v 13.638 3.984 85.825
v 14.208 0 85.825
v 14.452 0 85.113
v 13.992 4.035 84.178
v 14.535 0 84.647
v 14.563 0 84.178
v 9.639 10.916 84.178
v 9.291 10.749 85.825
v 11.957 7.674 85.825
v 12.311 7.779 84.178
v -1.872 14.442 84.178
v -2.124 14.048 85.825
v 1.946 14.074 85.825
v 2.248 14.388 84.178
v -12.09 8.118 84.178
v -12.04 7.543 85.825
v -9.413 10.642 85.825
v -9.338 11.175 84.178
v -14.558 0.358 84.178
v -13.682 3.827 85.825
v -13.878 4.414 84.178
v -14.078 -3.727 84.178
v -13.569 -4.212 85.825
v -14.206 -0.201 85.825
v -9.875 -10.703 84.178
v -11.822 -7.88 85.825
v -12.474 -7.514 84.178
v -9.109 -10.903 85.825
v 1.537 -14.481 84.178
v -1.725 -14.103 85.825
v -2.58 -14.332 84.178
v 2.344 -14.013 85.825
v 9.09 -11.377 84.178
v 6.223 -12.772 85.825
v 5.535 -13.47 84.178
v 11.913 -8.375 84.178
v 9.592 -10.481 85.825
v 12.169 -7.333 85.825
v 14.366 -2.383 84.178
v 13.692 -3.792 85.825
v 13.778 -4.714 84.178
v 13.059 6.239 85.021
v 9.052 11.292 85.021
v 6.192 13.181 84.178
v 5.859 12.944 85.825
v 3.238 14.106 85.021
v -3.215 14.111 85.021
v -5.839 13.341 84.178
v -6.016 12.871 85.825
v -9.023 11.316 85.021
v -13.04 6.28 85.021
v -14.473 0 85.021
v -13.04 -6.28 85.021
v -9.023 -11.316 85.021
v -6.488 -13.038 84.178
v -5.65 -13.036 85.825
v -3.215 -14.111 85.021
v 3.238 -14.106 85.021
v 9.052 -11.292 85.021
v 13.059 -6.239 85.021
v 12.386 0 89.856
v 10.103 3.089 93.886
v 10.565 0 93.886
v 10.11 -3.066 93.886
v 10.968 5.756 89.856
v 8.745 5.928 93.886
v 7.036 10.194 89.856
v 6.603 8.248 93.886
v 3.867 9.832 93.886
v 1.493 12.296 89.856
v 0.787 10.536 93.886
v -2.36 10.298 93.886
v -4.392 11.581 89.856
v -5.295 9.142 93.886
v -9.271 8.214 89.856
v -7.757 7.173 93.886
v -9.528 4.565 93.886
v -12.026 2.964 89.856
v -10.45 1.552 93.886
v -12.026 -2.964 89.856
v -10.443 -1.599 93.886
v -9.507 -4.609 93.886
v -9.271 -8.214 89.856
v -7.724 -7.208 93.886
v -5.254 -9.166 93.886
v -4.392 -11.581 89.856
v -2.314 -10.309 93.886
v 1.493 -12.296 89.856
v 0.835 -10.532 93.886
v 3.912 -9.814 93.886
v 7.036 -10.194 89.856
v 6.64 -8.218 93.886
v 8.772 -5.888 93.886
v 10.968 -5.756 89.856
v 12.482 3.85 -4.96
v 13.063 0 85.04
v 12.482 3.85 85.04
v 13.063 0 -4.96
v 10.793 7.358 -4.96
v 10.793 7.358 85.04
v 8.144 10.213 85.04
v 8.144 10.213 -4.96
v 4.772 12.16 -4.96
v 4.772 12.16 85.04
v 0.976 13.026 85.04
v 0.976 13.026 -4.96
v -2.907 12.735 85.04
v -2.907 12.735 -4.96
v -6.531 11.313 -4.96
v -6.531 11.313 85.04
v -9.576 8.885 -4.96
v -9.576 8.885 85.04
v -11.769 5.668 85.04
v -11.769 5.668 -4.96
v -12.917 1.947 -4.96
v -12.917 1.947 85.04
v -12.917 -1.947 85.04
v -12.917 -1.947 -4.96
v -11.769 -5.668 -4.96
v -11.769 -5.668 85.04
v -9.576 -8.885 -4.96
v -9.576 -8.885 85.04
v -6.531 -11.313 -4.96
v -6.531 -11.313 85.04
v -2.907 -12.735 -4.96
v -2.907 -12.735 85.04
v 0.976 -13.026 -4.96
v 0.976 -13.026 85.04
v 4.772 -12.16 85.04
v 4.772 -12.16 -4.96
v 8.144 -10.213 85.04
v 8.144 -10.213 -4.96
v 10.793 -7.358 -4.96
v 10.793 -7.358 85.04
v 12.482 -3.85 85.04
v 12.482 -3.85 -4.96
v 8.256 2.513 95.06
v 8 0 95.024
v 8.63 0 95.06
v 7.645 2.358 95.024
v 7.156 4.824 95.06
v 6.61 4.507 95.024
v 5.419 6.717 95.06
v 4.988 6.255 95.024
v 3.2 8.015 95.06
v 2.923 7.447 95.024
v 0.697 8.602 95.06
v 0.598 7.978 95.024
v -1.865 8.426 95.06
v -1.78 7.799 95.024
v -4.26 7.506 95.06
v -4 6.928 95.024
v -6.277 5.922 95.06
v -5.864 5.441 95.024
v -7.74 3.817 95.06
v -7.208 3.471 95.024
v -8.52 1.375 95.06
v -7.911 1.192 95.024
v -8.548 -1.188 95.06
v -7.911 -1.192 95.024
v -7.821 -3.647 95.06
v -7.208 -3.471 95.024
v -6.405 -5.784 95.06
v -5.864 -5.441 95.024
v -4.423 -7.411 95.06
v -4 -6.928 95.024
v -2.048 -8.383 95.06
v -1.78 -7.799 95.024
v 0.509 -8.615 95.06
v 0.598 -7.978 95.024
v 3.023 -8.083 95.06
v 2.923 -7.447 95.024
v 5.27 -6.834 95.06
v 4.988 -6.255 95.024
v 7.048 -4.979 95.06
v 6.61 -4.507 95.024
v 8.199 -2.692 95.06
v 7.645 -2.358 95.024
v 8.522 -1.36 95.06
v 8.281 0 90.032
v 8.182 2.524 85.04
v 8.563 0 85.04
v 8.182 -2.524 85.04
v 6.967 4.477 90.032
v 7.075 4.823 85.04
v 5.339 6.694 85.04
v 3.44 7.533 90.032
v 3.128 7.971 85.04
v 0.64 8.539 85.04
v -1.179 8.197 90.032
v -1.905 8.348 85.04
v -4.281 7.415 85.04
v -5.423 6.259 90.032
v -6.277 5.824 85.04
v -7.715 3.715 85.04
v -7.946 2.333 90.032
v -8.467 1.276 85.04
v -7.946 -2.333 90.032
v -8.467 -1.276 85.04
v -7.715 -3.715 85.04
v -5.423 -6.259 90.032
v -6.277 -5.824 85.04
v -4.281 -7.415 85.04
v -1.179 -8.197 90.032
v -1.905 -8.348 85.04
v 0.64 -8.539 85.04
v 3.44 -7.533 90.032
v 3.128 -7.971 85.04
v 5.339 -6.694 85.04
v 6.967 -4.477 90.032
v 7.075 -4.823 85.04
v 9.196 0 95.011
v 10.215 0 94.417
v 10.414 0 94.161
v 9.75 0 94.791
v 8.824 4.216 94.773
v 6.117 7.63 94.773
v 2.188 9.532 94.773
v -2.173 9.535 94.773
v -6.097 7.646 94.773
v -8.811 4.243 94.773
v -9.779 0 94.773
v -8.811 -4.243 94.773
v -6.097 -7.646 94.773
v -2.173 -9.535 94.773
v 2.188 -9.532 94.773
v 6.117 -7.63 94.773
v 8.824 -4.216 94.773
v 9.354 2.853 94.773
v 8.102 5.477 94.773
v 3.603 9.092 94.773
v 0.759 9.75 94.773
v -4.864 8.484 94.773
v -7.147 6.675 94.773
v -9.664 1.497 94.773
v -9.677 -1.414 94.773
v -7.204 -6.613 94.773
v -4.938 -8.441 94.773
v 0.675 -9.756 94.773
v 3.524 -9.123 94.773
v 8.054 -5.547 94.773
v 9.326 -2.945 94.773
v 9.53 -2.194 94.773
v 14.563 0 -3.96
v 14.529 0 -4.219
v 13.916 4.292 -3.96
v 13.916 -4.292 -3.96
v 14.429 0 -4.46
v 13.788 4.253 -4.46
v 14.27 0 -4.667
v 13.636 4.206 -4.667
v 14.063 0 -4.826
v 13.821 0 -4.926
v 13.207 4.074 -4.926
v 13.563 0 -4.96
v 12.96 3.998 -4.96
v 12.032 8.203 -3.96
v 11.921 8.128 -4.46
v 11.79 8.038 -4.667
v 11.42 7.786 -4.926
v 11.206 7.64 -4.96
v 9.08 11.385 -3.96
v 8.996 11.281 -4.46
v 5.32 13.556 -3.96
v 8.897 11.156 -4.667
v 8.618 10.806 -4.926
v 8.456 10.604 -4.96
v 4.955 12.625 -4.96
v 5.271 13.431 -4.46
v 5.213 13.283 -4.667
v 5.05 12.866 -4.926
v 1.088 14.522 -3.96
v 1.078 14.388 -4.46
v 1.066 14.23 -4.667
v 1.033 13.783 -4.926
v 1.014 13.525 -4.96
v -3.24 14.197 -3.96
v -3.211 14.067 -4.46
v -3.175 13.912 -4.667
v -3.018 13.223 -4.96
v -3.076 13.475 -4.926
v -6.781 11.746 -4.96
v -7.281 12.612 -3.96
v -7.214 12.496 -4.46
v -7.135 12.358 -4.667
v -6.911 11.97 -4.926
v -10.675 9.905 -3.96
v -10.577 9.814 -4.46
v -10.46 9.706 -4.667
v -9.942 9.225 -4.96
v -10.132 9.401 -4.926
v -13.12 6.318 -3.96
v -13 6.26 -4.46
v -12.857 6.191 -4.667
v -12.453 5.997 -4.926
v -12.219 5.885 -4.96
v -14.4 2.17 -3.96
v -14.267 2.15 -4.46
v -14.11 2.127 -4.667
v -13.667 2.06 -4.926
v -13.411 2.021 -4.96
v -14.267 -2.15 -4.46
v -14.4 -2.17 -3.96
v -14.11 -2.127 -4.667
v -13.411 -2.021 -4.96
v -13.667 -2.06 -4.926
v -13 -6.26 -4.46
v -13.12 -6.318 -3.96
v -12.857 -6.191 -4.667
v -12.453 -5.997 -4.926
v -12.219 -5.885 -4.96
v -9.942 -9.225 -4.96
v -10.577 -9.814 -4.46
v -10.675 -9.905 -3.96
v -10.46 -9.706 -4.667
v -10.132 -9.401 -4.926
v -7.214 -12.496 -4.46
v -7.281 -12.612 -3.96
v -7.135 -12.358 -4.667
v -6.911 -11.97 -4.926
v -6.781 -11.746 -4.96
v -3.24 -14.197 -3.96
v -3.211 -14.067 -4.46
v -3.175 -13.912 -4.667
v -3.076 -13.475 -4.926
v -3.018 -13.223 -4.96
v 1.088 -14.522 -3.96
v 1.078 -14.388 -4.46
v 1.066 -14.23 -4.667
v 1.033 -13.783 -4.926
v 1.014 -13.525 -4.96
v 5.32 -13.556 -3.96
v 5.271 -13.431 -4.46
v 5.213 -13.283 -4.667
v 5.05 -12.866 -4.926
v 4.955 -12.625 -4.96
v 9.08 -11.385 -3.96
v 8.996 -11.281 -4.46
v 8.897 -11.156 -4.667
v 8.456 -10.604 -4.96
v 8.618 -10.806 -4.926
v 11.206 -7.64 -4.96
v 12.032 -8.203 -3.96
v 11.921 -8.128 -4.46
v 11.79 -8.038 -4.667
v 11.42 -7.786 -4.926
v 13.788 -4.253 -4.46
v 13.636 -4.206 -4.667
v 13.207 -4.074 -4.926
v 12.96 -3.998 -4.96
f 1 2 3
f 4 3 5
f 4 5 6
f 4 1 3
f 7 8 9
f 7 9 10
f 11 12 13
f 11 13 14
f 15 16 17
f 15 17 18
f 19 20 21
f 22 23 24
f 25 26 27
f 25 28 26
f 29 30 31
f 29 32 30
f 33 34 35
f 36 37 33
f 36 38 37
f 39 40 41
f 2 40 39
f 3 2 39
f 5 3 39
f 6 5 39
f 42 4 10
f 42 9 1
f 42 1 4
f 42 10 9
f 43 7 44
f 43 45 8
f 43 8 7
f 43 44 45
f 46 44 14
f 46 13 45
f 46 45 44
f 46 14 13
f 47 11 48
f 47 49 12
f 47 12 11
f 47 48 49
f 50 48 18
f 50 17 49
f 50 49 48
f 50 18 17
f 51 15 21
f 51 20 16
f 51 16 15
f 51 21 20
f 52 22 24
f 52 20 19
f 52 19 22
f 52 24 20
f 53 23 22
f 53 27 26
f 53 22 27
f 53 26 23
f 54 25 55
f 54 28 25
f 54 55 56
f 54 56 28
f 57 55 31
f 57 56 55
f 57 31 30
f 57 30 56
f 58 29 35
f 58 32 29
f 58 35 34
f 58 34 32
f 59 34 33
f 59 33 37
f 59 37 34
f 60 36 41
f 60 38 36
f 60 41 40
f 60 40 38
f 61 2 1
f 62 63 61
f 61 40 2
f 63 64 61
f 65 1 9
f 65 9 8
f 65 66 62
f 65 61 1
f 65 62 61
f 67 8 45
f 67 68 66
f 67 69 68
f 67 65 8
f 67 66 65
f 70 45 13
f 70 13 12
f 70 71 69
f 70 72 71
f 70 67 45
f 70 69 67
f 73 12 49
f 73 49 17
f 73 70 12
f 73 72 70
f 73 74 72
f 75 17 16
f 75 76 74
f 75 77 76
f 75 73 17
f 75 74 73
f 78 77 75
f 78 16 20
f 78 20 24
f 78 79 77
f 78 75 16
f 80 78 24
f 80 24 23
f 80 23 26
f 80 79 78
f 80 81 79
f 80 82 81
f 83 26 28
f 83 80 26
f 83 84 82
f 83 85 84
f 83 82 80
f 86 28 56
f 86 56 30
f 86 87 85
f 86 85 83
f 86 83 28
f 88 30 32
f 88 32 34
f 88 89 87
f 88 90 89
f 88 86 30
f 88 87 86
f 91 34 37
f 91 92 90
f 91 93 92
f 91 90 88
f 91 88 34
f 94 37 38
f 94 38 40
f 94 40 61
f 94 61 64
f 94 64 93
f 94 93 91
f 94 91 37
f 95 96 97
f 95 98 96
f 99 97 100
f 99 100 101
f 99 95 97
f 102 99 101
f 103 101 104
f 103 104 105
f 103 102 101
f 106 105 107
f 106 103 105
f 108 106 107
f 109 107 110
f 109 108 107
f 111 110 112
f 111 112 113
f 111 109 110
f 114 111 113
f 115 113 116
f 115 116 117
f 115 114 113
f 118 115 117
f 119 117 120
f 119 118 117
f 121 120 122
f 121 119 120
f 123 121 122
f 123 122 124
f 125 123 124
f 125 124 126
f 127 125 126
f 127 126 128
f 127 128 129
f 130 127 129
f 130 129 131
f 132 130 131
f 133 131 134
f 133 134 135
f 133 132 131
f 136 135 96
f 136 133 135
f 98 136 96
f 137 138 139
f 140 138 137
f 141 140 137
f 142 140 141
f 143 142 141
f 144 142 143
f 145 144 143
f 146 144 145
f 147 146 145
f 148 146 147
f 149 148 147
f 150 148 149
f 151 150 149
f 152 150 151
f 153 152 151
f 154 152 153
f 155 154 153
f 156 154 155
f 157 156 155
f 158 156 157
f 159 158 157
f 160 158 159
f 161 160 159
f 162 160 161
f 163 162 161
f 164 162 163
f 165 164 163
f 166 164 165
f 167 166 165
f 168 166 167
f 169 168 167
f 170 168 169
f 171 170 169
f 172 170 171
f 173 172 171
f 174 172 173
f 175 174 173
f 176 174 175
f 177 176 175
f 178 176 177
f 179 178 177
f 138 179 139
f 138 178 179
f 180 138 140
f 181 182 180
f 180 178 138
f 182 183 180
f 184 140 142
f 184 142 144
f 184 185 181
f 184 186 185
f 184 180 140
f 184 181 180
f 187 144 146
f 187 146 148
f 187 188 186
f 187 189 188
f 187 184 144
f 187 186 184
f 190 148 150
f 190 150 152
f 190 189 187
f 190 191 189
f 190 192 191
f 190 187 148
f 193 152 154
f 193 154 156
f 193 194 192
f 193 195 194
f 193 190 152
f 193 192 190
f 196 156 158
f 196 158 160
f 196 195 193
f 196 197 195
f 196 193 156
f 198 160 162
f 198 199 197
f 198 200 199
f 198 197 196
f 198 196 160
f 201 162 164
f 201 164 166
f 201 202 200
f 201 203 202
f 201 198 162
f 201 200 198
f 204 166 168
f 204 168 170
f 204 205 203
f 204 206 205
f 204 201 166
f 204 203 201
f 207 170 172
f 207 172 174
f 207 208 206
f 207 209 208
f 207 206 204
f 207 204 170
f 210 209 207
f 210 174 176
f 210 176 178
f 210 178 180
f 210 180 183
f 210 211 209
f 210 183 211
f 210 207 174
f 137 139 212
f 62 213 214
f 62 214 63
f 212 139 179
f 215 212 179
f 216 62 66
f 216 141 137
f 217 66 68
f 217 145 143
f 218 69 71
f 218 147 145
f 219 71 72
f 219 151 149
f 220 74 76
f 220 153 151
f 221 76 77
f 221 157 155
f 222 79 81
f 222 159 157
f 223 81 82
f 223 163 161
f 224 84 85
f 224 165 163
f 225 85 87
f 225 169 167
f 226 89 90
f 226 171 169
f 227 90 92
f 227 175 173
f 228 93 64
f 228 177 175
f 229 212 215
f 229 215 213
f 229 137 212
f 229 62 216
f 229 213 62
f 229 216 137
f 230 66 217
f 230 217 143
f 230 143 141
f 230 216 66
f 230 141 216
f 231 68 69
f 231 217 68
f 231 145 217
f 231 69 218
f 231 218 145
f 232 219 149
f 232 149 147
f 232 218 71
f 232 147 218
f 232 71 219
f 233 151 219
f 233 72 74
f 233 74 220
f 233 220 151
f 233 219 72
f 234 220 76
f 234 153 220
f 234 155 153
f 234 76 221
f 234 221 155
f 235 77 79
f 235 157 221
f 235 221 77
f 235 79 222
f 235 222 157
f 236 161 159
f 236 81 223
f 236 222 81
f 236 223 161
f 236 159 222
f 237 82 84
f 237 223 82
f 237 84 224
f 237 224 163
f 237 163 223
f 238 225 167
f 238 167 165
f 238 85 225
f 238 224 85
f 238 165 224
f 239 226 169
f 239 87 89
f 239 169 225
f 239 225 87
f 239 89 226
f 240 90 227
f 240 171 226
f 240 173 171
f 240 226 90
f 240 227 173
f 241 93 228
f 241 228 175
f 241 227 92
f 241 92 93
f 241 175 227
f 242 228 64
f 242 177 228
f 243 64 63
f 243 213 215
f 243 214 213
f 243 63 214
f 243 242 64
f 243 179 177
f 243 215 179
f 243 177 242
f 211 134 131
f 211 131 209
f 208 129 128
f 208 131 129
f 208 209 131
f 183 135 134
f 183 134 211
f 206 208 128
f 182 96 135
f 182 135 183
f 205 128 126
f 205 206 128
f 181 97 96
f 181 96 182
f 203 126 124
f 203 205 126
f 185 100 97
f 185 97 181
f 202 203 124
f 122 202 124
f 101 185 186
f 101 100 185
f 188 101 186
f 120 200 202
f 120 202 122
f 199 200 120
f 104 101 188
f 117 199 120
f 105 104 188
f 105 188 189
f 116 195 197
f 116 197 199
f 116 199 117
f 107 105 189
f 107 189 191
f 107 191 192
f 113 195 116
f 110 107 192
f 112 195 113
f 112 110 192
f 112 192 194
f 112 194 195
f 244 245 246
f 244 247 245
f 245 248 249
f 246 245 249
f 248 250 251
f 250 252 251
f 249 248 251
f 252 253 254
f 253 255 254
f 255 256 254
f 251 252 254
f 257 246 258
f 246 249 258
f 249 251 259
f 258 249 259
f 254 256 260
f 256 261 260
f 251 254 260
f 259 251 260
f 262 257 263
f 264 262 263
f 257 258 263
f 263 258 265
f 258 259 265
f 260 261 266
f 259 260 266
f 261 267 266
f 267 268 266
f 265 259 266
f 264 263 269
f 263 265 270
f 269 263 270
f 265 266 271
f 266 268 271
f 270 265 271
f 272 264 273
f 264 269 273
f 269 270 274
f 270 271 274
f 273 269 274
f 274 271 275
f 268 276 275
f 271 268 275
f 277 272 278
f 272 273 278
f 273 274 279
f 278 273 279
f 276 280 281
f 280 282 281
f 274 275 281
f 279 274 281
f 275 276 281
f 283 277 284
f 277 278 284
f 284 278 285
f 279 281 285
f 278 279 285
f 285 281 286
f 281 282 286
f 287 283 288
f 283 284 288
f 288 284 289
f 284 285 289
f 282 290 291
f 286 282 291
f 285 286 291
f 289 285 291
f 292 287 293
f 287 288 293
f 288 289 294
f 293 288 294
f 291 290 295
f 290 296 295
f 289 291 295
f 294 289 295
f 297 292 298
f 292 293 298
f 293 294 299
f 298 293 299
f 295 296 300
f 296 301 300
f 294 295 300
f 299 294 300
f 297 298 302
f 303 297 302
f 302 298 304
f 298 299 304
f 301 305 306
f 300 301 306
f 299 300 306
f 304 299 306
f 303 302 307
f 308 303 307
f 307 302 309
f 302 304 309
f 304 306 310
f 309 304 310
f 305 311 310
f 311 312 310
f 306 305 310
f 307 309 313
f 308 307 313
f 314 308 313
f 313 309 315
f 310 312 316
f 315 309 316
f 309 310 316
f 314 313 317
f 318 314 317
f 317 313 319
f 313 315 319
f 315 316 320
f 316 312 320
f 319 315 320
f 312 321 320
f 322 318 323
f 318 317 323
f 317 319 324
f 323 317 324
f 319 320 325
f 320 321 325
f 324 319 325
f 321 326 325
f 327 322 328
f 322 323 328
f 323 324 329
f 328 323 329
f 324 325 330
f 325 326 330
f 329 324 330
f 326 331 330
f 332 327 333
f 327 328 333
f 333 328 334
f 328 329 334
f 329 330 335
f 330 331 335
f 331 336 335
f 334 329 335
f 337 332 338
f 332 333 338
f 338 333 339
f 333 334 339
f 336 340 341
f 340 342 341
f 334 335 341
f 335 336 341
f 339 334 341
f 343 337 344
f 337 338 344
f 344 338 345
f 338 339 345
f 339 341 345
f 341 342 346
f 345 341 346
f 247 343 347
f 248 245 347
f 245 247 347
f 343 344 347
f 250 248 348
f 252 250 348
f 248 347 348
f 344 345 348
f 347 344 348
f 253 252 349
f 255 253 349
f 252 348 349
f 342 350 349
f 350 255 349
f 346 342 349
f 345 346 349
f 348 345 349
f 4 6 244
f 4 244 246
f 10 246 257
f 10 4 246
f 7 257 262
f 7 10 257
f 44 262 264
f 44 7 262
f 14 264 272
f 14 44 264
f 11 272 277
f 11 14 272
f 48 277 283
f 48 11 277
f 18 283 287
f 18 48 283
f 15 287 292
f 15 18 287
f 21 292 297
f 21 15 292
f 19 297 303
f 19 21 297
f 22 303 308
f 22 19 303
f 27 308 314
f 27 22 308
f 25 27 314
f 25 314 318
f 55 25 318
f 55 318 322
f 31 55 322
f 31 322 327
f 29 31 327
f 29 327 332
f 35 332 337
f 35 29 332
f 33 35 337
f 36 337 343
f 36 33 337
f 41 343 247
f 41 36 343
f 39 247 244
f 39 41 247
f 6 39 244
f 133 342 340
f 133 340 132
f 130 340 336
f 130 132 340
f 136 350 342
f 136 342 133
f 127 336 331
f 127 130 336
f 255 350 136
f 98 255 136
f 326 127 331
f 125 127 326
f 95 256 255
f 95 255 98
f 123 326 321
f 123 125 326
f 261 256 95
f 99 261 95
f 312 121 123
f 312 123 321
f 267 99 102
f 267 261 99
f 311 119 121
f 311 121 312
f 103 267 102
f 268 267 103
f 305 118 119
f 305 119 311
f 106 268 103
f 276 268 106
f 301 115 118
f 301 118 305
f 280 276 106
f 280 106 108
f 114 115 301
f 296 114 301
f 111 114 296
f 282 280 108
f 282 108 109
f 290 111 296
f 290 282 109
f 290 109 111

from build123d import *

# Parameters (mm, degrees)
F3_R = 2
F4_R = 4
F5_R = 1


with BuildPart() as f2:
    # F0 (on Front) → F2 (revolve)
    with BuildSketch(Plane.XZ):
        Polygon((10, 95.136816), (8, 95.02412), (8.562585, 85.039958), (13.062585, 85.039958), (13.062585, -4.960042), (14.562585, -4.960042), (14.562585, 85.039958), align=None)
    revolve(axis=Axis((0, 0, 47.995005), (0, 0, 1)))

    # F3
    f3_edges = [f2.edges().sort_by_distance(p)[0] for p in [
        (-10, 0, 95.136816),
    ]]
    fillet(f3_edges, radius=F3_R)

    # F4
    f4_edges = [f2.edges().sort_by_distance(p)[0] for p in [
        (-14.562585, 0, 85.039958),
    ]]
    fillet(f4_edges, radius=F4_R)

    # F5
    f5_edges = [f2.edges().sort_by_distance(p)[0] for p in [
        (-14.562585, 0, -4.960042),
    ]]
    fillet(f5_edges, radius=F5_R)


solid = f2.part
